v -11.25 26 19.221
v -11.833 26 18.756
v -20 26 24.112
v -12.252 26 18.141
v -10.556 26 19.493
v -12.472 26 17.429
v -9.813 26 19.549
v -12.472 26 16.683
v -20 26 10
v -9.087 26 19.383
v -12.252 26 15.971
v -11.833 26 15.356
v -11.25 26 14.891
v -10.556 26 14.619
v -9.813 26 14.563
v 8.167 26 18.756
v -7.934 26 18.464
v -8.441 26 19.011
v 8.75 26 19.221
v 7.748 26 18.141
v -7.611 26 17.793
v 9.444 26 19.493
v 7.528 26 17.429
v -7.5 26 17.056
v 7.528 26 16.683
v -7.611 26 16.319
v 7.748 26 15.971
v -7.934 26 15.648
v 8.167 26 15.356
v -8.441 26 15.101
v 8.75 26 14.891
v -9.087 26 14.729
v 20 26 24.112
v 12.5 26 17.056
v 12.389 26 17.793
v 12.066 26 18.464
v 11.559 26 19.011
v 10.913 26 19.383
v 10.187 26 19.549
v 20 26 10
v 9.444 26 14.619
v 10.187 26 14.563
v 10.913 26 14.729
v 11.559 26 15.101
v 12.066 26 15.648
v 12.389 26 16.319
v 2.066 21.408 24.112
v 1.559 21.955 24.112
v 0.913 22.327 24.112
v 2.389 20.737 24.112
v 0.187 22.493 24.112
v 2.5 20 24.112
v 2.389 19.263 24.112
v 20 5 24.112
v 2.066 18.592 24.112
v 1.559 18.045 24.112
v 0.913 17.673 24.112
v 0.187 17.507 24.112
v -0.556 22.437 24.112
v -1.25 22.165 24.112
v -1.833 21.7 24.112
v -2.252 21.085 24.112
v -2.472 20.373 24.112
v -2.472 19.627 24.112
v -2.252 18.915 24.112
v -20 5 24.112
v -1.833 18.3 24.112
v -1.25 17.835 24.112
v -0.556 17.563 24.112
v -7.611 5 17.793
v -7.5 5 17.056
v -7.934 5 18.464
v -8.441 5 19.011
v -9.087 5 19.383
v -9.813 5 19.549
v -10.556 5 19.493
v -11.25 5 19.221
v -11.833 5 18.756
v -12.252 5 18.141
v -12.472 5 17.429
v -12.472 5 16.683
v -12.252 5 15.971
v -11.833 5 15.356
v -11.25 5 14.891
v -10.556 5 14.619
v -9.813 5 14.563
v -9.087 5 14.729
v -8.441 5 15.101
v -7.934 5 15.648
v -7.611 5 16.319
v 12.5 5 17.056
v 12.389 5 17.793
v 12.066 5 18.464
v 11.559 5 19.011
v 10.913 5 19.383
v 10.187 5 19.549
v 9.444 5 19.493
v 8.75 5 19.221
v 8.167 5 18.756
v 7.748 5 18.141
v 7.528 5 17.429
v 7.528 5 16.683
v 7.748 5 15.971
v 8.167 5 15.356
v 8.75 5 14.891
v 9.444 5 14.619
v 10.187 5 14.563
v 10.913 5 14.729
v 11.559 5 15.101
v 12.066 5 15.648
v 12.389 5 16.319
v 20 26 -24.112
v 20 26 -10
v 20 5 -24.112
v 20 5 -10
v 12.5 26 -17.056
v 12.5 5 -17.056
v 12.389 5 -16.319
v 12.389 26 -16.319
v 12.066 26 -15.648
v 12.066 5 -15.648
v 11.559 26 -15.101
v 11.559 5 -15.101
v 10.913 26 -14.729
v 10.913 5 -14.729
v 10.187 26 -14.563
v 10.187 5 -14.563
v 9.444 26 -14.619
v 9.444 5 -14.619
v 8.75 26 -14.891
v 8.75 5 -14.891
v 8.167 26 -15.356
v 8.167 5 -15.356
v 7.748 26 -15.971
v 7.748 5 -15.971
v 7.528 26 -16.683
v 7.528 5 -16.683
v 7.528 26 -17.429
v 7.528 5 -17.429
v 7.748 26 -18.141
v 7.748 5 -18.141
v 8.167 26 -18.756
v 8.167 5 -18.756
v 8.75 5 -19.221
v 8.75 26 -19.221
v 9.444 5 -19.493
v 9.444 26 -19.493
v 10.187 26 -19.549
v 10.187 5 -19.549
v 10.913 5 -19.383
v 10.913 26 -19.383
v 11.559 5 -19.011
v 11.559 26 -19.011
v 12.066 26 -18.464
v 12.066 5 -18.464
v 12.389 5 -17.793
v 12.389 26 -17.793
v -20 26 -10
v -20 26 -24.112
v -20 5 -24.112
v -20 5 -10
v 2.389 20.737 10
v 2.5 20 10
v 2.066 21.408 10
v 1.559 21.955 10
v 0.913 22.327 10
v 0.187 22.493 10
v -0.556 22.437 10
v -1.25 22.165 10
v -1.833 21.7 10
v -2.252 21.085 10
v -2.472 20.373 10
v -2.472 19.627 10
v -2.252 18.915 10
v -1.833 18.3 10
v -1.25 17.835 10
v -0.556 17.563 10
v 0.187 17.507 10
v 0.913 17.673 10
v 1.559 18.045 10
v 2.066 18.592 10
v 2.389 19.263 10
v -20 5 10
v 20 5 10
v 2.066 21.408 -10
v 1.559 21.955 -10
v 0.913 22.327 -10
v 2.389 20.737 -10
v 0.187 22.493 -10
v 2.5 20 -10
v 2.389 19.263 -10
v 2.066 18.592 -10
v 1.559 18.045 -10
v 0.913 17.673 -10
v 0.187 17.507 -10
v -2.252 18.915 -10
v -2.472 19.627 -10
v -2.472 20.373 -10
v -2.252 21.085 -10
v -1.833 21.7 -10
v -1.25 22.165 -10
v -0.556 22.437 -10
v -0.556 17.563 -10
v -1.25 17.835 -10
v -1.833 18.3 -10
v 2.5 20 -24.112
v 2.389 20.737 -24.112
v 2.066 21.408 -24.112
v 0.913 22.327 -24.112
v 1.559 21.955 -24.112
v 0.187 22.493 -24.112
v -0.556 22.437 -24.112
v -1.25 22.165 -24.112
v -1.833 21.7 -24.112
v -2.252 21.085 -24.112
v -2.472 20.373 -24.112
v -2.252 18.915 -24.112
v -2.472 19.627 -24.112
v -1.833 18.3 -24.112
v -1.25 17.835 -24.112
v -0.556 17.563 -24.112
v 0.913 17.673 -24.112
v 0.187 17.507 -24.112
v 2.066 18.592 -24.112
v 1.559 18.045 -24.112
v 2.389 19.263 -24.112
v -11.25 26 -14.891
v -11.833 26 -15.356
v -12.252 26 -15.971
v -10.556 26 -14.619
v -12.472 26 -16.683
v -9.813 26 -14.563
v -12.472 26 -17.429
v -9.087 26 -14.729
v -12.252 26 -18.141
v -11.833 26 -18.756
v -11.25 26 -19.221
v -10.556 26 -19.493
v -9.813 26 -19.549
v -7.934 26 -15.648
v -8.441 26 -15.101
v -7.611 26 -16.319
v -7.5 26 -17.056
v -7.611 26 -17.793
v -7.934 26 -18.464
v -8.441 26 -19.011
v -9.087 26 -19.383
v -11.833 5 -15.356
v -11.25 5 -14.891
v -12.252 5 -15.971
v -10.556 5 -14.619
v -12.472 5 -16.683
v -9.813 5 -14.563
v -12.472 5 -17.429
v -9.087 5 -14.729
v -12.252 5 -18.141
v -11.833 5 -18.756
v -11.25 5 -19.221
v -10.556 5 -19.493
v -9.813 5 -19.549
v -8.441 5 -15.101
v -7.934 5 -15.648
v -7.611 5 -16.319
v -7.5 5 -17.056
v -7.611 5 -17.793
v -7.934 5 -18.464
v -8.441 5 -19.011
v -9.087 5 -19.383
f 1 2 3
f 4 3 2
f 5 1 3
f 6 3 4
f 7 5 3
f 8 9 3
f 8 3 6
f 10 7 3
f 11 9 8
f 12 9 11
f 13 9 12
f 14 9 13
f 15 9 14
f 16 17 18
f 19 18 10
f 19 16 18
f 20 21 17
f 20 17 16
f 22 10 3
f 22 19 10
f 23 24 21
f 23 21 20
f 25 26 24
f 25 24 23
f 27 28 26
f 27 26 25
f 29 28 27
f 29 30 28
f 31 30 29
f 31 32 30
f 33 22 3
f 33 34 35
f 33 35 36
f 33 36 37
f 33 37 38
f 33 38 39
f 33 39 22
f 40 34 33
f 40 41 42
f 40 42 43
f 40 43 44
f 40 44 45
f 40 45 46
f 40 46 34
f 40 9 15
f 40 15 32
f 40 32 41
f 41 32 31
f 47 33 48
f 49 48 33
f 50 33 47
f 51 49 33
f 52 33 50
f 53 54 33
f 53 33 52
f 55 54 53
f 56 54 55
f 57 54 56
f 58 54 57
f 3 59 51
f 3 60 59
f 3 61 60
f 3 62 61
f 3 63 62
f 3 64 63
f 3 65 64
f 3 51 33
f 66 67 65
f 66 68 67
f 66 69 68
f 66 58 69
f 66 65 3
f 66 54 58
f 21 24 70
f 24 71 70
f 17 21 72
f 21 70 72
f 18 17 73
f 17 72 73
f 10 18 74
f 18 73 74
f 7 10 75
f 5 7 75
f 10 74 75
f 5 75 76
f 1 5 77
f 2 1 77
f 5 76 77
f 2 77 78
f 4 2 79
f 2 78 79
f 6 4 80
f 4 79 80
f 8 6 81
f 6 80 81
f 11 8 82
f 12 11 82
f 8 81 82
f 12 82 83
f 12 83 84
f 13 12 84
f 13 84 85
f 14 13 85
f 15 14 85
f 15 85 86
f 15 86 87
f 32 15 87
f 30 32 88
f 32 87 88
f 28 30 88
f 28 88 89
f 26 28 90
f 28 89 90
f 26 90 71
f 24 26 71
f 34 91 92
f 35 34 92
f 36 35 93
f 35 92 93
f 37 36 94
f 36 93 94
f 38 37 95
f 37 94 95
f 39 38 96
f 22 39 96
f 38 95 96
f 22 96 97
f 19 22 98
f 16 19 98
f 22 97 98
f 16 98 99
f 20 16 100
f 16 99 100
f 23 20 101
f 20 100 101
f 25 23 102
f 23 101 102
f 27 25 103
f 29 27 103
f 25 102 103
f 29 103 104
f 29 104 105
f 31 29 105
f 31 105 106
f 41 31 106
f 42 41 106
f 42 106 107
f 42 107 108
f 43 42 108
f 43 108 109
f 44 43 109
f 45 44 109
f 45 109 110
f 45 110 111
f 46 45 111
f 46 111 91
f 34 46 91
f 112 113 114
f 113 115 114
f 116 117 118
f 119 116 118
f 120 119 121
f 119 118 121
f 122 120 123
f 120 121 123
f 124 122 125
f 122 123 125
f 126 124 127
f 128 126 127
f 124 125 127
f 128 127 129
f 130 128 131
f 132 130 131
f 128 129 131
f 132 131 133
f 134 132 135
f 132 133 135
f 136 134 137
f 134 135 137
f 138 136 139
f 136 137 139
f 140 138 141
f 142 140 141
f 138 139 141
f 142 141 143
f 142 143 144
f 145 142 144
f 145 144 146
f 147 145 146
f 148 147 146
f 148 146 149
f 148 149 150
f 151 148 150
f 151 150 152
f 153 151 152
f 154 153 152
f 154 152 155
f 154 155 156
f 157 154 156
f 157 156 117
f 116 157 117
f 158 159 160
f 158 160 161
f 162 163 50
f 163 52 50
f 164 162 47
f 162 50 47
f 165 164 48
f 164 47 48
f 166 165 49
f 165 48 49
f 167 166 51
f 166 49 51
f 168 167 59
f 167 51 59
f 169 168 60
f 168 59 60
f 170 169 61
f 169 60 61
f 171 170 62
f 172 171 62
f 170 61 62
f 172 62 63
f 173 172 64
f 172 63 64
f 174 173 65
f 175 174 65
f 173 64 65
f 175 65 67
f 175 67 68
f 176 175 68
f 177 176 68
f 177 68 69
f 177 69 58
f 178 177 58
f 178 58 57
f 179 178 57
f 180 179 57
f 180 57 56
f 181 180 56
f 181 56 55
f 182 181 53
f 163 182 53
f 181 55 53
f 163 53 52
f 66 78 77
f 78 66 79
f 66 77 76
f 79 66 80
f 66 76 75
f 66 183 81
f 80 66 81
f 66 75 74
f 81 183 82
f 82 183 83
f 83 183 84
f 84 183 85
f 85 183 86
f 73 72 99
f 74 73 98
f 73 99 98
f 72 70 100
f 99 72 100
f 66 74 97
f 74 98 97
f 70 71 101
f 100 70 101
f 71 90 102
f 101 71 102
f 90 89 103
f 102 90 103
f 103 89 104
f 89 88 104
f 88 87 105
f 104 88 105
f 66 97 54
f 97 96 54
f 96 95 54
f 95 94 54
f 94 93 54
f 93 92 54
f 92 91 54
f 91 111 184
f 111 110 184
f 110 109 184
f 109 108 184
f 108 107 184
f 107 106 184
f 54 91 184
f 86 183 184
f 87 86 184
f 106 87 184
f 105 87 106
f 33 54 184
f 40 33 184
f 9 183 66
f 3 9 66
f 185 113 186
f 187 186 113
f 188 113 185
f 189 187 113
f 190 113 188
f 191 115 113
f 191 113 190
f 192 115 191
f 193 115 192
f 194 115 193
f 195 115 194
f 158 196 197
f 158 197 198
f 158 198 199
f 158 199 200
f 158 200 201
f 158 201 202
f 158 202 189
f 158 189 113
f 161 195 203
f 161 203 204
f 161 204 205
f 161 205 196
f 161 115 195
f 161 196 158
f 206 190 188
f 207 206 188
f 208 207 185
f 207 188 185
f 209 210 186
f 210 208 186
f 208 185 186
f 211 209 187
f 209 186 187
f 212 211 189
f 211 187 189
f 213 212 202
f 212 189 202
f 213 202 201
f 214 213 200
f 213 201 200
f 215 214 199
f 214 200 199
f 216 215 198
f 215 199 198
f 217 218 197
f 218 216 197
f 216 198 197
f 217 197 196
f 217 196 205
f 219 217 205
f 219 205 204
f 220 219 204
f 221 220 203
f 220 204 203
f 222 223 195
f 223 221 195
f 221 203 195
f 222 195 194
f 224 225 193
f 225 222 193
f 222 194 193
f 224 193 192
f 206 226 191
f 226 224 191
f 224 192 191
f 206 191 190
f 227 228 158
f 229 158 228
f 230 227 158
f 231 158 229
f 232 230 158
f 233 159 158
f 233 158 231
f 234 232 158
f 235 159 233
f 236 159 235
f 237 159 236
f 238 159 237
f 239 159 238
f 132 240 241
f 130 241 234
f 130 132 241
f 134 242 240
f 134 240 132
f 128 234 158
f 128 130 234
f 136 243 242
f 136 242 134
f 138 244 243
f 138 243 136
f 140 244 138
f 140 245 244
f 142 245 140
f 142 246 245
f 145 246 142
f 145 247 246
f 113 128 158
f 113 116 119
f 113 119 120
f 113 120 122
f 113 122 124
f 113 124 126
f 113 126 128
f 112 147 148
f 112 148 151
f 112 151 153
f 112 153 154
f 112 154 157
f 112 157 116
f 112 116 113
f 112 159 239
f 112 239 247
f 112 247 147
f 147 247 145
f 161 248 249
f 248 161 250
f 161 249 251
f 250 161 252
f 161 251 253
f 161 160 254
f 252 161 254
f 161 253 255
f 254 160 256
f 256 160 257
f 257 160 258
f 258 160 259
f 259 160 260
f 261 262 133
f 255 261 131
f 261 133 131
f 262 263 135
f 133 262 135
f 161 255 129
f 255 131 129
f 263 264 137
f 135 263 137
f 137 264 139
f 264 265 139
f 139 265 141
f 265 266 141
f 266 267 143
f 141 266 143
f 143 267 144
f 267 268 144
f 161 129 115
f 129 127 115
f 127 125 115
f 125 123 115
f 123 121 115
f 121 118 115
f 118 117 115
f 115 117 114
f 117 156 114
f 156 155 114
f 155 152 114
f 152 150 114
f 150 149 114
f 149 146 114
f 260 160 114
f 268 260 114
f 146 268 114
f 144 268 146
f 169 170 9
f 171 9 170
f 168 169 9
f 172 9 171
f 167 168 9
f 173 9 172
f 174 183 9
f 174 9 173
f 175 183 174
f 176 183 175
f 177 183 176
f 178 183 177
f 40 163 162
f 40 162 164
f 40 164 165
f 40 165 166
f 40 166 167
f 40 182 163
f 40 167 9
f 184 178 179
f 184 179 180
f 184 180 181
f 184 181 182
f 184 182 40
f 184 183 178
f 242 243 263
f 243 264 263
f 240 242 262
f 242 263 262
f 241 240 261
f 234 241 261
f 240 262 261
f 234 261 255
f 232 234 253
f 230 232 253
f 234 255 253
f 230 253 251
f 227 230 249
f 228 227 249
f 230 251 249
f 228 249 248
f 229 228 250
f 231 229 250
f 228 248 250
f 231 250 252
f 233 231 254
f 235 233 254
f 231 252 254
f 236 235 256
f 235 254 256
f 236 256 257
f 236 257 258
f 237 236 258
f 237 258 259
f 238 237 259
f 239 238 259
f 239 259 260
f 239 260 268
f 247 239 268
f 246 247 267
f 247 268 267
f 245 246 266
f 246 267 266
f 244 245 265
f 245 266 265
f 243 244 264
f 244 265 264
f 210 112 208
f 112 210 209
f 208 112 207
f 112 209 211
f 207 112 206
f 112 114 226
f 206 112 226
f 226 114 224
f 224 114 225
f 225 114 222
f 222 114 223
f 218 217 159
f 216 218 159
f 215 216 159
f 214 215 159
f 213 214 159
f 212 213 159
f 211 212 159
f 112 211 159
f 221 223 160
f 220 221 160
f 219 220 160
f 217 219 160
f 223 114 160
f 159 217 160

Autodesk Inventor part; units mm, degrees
ref_plane "Work Plane1" through (-20, 5, 54.056) normal (0, 1, 0) x (1, 0, 0)
sketch "Sketch2" plane through (-20, 5, 54.056) normal (0, 1, 0) x (1, 0, 0)
  point P0 (20, 54.056)
ref_plane "Work Plane2" through (-20, 5, 54.056) normal (0, 1, 0) x (1, 0, 0)
sketch "Sketch3" plane through (-20, 5, 54.056) normal (0, 1, 0) x (1, 0, 0)
  circle A0 centre (10, 71.112) radius 2.5 projected
  circle A1 centre (10, 37) radius 2.5 projected
  line L0 (10, 71.112) -> (10, 64.056)
  line L1 (10, 64.056) -> (0, 64.056)
  line L2 (0, 108.112) -> (0, 0) projected
  line L3 (40, 0) -> (40, 108.112) projected
  line L4 (0, 64.056) -> (40, 64.056)
  line L5 (40, 64.056) -> (40, 78.168)
  line L6 (40, 78.168) -> (0, 78.168)
  line L7 (0, 78.168) -> (0, 64.056)
  line L8 (20, 54.056) -> (40, 54.056)
  line L9 (0, 0) -> (0, 108.112)
  line L10 (40, 108.112) -> (40, 0)
  line L11 (0, 44.056) -> (40, 44.056)
  line L12 (40, 29.944) -> (0, 29.944)
  circle A2 centre (30, 71.112) radius 2.5 projected
  circle A3 centre (30, 71.112) radius 2.5
  circle A4 centre (30, 37) radius 2.5 projected
  circle A5 centre (30, 37) radius 2.5
  dimension "d1" = 7.056
  dimension "d2" = 14.112
extrude "Extrusion1" add sketch "Sketch3" along normal blind 25 contours L1 L2 L6 L3 L4 | L11 L3 L12 L2
sketch "Sketch4" plane through (-20, 5, 24.112) normal (0, 0, 1) x (1, 0, 0)
  line L0 (40, 25) -> (0, 25) projected
  line L1 (0, 25) -> (20, 25)
  line L2 (20, 25) -> (20, 15)
  circle A0 centre (20, 15) radius 2.5
  point P0 (20, -5)
  dimension "d5" = 10
  dimension "d6" = 5
extrude "Extrusion2" cut sketch "Sketch4" against normal through all
ref_plane "Work Plane3" through (-20, 30, 54.056) normal (0, 1, 0) x (1, 0, 0)
sketch "Sketch6" plane through (-20, 30, 54.056) normal (0, 1, 0) x (1, 0, 0)
  line L0 (55.7566, 97.8205) -> (-24.6957, 97.8205)
  line L1 (-24.6957, 97.8205) -> (-24.6957, 9.1741)
  line L2 (-24.6957, 9.1741) -> (55.7566, 9.1741)
  line L3 (55.7566, 9.1741) -> (55.7566, 97.8205)
  point P0 (20, 54.056)
extrude "Extrusion4" cut sketch "Sketch6" against normal blind 4
properties part number "linac_lower_ax_2020_mnt" material "PET Plastic"
